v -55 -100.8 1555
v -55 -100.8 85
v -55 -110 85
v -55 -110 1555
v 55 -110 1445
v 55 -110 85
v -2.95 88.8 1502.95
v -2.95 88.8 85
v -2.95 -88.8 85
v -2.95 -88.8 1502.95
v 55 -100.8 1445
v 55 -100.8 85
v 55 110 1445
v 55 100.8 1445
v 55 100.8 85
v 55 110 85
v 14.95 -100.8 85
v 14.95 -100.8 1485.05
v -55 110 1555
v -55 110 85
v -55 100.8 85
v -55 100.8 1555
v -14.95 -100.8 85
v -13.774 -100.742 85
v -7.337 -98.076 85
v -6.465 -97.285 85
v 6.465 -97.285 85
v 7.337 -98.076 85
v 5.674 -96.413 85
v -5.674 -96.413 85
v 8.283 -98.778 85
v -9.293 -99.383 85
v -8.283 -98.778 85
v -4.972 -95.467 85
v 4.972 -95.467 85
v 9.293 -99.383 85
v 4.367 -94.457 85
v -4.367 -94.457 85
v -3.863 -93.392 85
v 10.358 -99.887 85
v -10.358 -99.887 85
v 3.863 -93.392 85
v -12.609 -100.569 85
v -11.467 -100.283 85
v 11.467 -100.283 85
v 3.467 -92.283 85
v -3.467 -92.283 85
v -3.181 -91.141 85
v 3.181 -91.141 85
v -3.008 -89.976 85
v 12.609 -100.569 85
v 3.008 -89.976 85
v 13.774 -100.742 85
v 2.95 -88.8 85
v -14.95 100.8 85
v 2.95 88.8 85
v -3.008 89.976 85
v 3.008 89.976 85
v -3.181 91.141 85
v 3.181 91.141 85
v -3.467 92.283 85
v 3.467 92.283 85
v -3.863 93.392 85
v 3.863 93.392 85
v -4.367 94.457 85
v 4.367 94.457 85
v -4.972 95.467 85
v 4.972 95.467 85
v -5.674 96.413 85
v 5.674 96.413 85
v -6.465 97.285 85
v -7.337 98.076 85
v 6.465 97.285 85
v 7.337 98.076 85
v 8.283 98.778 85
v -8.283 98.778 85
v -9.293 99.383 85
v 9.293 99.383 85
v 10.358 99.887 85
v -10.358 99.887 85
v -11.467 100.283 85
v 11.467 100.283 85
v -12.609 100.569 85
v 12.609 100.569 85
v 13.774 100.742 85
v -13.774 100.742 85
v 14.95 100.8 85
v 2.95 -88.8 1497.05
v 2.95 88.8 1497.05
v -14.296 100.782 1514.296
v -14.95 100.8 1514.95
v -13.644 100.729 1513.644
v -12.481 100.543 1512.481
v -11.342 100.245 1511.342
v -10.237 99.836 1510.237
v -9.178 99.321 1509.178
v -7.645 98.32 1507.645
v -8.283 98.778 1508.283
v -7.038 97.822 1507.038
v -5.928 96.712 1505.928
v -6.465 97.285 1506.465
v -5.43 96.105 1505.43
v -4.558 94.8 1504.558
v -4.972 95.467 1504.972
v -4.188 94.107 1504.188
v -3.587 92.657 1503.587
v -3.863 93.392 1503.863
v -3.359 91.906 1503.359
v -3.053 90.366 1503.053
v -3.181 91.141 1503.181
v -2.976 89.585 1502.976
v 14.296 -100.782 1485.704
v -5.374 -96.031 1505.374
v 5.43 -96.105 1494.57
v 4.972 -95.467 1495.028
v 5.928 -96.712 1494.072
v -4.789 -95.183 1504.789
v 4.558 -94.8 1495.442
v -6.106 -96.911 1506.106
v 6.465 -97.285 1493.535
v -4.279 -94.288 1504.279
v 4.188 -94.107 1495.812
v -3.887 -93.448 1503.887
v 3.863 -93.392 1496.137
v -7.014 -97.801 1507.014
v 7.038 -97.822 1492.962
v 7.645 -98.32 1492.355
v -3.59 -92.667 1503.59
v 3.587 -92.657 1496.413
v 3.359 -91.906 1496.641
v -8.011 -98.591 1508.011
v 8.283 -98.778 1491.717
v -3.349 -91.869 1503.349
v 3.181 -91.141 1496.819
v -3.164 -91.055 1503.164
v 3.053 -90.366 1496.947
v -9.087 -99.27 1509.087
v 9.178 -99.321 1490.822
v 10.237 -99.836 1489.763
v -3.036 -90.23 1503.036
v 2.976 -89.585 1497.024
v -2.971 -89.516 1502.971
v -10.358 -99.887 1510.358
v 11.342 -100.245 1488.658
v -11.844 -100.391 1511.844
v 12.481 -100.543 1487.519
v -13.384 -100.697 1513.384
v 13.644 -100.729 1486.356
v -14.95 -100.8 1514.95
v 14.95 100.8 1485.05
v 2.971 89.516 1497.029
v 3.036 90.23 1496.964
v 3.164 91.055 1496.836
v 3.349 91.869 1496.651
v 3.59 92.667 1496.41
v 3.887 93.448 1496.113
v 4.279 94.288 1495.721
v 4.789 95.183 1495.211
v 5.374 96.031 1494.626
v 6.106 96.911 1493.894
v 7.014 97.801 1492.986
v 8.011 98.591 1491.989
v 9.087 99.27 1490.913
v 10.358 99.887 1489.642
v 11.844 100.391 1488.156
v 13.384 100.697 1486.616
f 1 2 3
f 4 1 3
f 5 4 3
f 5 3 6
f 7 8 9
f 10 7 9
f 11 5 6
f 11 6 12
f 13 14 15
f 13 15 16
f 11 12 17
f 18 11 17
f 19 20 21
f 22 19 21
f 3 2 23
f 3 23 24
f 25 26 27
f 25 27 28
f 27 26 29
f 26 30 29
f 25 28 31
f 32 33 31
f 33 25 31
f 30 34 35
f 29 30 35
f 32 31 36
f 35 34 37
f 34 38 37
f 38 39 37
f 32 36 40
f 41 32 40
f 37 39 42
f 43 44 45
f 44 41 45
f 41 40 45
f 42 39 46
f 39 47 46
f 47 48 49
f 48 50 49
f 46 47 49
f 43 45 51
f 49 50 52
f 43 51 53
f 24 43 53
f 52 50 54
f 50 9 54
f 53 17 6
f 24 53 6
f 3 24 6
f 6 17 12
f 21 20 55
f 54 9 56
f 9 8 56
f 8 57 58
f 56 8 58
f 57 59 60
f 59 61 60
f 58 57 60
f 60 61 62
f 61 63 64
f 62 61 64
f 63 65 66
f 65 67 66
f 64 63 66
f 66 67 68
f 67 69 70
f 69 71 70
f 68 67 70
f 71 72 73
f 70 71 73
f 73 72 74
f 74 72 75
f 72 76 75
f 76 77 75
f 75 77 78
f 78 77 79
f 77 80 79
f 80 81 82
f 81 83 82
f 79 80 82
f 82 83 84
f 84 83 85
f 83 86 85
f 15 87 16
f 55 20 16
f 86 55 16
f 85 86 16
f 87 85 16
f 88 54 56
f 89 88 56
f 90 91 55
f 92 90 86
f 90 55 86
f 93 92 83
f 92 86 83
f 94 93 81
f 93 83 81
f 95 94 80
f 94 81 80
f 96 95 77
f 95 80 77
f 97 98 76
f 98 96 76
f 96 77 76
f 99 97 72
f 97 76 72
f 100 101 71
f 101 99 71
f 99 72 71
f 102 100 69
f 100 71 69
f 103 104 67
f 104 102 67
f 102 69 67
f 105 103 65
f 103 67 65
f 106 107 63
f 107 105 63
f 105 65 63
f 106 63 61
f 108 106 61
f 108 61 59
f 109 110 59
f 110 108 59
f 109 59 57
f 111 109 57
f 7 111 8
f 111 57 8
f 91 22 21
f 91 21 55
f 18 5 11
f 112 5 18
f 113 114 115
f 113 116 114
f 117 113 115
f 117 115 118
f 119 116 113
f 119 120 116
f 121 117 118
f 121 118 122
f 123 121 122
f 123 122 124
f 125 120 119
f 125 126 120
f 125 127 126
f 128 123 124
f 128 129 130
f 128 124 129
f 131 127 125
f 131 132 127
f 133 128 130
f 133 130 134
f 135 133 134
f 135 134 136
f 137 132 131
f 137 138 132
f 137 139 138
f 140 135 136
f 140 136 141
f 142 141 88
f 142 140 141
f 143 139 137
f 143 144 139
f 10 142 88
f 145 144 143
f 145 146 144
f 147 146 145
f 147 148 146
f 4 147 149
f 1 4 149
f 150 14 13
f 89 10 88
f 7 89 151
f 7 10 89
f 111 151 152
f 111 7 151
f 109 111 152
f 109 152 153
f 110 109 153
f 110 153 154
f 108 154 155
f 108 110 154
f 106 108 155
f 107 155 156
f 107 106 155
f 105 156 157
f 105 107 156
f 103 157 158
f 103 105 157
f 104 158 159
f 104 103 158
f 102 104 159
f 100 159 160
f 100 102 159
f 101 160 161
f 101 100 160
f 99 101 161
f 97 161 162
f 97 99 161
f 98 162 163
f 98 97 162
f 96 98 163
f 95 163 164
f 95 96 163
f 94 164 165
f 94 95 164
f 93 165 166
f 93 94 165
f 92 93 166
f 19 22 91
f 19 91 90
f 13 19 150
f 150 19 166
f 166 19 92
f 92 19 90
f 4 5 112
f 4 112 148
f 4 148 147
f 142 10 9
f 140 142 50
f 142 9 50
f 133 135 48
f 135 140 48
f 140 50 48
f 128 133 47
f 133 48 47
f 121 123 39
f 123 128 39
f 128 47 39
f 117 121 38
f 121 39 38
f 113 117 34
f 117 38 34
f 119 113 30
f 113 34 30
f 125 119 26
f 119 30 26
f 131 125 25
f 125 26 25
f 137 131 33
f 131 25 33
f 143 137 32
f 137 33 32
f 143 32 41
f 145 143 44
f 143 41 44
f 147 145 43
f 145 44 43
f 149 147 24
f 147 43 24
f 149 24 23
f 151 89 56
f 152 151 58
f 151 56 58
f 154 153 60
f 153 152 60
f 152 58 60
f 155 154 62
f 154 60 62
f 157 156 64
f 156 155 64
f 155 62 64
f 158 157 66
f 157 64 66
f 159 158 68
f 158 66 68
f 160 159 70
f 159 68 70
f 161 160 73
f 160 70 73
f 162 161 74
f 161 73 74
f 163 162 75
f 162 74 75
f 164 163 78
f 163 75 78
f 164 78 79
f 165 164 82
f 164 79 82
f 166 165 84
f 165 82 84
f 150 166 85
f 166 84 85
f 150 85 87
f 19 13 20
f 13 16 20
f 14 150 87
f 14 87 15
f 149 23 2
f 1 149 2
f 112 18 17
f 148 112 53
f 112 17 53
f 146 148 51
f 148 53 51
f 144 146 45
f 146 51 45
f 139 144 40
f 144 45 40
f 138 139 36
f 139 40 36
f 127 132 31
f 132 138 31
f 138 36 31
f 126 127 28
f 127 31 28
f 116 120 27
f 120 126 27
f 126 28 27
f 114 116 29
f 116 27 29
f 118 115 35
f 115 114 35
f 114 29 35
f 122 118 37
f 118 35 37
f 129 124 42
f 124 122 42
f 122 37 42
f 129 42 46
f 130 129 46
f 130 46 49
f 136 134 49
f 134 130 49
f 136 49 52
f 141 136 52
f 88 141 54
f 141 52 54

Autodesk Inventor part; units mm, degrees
ref_plane "Start plane" through (0, 0, 85) normal (0, 0, 1) x (1, 0, 0)
ref_plane "End plane" through (0, 0, 1555) normal (0, 0, 1) x (1, 0, 0)
sketch "Sketch2" plane through (0, 0, 0) normal (0, 0, 1) x (1, 0, 0)
  line L0 (-55, 100.8) -> (-14.95, 100.8)
  line L1 (-55, 110) -> (-55, 100.8)
  line L2 (55, 110) -> (-55, 110)
  line L3 (55, 100.8) -> (55, 110)
  line L4 (14.95, 100.8) -> (55, 100.8)
  line L5 (2.95, -88.8) -> (2.95, 88.8)
  line L6 (55, -100.8) -> (14.95, -100.8)
  line L7 (55, -110) -> (55, -100.8)
  line L8 (-55, -100.8) -> (-55, -110)
  line L9 (-14.95, -100.8) -> (-55, -100.8)
  line L10 (-2.95, 88.8) -> (-2.95, -88.8)
  line L11 (0, -154) -> (0, 154) construction
  line L12 (-2.95, -100.8) -> (2.95, -100.8) construction
  arc A0 (-14.95, -100.8) -> (-2.95, -88.8) centre (-14.95, -88.8) ccw
  arc A1 (-2.95, 88.8) -> (-14.95, 100.8) centre (-14.95, 88.8) ccw
  arc A2 (14.95, 100.8) -> (2.95, 88.8) centre (14.95, 88.8) ccw
  arc A3 (2.95, -88.8) -> (14.95, -100.8) centre (14.95, -88.8) ccw
  line L13 (-77, 0) -> (77, 0) construction
  line L14 (-55, -110) -> (55, -110)
  point P0 (-2.95, 100.8)
  point P1 (2.95, 100.8)
  point P2 (0, 0)
  point P3 (0, -100.8)
  point P4 (0, 0)
  dimension "d1" = 220
  dimension "d3" = 9.2
  dimension "d5" = 5.9
  dimension "d7" = 110
  dimension "d13" = 12
  dimension "d14" = 110
  dimension "d15" = 55
extrude "Body" add sketch "Sketch2" along normal up to surface (1470 mm away) from surface at 85
sketch "Sketch3" plane through (0, 0, 0) normal (0, 0, 1) x (1, 0, 0)
  line L0 (0, 0) -> (10, 0)
ref_plane "Work Plane3" through (0, 0, 0) normal (0, -1, 0) x (1, 0, 0)
ref_plane "Work Plane4" through (-55, 0, 1555) normal (0.7071, 0, 0.7071) x (0.7071, 0, -0.7071)
split "Split1" plane through (-55, 0, 1555) removes the side toward (0.7071, 0, 0.7071)
ref_plane "Work Plane5" through (0, 4000, 85) normal (0, 0, -1) x (-1, 0, 0)
split "Split2" plane through (0, 4000, 85) removes the side toward (0, 0, -1)
sketch "Sketch4" plane through (0, 0, 0) normal (0, -1, 0) x (1, 0, 0)
  line L0 (-2, 85) -> (12, 85) projected
  line L1 (-2, 1555) -> (12, 1555) projected
  dimension "d19" = 1470
equation "\"d1\" = ParH"
equation "\"d3\" = t2"
equation "\"d5\" = t1"
equation "\"d7\" = b"
equation "\"d13\" = R1"
equation "\"d14\" = 0.5 * d1"
equation "\"d15\" = 0.5 * d7"
equation "\"d8\" = G_L"
equation "\"b\" = 110"
equation "\"ParH\" = 220"
equation "\"R1\" = 12"
equation "\"G_L\" = d19"
equation "\"t1\" = 5.9"
equation "\"t2\" = 9.2"
equation "\"G_OFFSET_START\" = -85"
equation "\"G_OFFSET_END\" = 55"
equation "\"d16\" = -G_OFFSET_START"
equation "\"d17\" = G_OFFSET_END + B_L"
equation "\"B_L\" = 1500"
properties part number "DIN 1025 - IPE 220-1470" material "Steel, Mild"
